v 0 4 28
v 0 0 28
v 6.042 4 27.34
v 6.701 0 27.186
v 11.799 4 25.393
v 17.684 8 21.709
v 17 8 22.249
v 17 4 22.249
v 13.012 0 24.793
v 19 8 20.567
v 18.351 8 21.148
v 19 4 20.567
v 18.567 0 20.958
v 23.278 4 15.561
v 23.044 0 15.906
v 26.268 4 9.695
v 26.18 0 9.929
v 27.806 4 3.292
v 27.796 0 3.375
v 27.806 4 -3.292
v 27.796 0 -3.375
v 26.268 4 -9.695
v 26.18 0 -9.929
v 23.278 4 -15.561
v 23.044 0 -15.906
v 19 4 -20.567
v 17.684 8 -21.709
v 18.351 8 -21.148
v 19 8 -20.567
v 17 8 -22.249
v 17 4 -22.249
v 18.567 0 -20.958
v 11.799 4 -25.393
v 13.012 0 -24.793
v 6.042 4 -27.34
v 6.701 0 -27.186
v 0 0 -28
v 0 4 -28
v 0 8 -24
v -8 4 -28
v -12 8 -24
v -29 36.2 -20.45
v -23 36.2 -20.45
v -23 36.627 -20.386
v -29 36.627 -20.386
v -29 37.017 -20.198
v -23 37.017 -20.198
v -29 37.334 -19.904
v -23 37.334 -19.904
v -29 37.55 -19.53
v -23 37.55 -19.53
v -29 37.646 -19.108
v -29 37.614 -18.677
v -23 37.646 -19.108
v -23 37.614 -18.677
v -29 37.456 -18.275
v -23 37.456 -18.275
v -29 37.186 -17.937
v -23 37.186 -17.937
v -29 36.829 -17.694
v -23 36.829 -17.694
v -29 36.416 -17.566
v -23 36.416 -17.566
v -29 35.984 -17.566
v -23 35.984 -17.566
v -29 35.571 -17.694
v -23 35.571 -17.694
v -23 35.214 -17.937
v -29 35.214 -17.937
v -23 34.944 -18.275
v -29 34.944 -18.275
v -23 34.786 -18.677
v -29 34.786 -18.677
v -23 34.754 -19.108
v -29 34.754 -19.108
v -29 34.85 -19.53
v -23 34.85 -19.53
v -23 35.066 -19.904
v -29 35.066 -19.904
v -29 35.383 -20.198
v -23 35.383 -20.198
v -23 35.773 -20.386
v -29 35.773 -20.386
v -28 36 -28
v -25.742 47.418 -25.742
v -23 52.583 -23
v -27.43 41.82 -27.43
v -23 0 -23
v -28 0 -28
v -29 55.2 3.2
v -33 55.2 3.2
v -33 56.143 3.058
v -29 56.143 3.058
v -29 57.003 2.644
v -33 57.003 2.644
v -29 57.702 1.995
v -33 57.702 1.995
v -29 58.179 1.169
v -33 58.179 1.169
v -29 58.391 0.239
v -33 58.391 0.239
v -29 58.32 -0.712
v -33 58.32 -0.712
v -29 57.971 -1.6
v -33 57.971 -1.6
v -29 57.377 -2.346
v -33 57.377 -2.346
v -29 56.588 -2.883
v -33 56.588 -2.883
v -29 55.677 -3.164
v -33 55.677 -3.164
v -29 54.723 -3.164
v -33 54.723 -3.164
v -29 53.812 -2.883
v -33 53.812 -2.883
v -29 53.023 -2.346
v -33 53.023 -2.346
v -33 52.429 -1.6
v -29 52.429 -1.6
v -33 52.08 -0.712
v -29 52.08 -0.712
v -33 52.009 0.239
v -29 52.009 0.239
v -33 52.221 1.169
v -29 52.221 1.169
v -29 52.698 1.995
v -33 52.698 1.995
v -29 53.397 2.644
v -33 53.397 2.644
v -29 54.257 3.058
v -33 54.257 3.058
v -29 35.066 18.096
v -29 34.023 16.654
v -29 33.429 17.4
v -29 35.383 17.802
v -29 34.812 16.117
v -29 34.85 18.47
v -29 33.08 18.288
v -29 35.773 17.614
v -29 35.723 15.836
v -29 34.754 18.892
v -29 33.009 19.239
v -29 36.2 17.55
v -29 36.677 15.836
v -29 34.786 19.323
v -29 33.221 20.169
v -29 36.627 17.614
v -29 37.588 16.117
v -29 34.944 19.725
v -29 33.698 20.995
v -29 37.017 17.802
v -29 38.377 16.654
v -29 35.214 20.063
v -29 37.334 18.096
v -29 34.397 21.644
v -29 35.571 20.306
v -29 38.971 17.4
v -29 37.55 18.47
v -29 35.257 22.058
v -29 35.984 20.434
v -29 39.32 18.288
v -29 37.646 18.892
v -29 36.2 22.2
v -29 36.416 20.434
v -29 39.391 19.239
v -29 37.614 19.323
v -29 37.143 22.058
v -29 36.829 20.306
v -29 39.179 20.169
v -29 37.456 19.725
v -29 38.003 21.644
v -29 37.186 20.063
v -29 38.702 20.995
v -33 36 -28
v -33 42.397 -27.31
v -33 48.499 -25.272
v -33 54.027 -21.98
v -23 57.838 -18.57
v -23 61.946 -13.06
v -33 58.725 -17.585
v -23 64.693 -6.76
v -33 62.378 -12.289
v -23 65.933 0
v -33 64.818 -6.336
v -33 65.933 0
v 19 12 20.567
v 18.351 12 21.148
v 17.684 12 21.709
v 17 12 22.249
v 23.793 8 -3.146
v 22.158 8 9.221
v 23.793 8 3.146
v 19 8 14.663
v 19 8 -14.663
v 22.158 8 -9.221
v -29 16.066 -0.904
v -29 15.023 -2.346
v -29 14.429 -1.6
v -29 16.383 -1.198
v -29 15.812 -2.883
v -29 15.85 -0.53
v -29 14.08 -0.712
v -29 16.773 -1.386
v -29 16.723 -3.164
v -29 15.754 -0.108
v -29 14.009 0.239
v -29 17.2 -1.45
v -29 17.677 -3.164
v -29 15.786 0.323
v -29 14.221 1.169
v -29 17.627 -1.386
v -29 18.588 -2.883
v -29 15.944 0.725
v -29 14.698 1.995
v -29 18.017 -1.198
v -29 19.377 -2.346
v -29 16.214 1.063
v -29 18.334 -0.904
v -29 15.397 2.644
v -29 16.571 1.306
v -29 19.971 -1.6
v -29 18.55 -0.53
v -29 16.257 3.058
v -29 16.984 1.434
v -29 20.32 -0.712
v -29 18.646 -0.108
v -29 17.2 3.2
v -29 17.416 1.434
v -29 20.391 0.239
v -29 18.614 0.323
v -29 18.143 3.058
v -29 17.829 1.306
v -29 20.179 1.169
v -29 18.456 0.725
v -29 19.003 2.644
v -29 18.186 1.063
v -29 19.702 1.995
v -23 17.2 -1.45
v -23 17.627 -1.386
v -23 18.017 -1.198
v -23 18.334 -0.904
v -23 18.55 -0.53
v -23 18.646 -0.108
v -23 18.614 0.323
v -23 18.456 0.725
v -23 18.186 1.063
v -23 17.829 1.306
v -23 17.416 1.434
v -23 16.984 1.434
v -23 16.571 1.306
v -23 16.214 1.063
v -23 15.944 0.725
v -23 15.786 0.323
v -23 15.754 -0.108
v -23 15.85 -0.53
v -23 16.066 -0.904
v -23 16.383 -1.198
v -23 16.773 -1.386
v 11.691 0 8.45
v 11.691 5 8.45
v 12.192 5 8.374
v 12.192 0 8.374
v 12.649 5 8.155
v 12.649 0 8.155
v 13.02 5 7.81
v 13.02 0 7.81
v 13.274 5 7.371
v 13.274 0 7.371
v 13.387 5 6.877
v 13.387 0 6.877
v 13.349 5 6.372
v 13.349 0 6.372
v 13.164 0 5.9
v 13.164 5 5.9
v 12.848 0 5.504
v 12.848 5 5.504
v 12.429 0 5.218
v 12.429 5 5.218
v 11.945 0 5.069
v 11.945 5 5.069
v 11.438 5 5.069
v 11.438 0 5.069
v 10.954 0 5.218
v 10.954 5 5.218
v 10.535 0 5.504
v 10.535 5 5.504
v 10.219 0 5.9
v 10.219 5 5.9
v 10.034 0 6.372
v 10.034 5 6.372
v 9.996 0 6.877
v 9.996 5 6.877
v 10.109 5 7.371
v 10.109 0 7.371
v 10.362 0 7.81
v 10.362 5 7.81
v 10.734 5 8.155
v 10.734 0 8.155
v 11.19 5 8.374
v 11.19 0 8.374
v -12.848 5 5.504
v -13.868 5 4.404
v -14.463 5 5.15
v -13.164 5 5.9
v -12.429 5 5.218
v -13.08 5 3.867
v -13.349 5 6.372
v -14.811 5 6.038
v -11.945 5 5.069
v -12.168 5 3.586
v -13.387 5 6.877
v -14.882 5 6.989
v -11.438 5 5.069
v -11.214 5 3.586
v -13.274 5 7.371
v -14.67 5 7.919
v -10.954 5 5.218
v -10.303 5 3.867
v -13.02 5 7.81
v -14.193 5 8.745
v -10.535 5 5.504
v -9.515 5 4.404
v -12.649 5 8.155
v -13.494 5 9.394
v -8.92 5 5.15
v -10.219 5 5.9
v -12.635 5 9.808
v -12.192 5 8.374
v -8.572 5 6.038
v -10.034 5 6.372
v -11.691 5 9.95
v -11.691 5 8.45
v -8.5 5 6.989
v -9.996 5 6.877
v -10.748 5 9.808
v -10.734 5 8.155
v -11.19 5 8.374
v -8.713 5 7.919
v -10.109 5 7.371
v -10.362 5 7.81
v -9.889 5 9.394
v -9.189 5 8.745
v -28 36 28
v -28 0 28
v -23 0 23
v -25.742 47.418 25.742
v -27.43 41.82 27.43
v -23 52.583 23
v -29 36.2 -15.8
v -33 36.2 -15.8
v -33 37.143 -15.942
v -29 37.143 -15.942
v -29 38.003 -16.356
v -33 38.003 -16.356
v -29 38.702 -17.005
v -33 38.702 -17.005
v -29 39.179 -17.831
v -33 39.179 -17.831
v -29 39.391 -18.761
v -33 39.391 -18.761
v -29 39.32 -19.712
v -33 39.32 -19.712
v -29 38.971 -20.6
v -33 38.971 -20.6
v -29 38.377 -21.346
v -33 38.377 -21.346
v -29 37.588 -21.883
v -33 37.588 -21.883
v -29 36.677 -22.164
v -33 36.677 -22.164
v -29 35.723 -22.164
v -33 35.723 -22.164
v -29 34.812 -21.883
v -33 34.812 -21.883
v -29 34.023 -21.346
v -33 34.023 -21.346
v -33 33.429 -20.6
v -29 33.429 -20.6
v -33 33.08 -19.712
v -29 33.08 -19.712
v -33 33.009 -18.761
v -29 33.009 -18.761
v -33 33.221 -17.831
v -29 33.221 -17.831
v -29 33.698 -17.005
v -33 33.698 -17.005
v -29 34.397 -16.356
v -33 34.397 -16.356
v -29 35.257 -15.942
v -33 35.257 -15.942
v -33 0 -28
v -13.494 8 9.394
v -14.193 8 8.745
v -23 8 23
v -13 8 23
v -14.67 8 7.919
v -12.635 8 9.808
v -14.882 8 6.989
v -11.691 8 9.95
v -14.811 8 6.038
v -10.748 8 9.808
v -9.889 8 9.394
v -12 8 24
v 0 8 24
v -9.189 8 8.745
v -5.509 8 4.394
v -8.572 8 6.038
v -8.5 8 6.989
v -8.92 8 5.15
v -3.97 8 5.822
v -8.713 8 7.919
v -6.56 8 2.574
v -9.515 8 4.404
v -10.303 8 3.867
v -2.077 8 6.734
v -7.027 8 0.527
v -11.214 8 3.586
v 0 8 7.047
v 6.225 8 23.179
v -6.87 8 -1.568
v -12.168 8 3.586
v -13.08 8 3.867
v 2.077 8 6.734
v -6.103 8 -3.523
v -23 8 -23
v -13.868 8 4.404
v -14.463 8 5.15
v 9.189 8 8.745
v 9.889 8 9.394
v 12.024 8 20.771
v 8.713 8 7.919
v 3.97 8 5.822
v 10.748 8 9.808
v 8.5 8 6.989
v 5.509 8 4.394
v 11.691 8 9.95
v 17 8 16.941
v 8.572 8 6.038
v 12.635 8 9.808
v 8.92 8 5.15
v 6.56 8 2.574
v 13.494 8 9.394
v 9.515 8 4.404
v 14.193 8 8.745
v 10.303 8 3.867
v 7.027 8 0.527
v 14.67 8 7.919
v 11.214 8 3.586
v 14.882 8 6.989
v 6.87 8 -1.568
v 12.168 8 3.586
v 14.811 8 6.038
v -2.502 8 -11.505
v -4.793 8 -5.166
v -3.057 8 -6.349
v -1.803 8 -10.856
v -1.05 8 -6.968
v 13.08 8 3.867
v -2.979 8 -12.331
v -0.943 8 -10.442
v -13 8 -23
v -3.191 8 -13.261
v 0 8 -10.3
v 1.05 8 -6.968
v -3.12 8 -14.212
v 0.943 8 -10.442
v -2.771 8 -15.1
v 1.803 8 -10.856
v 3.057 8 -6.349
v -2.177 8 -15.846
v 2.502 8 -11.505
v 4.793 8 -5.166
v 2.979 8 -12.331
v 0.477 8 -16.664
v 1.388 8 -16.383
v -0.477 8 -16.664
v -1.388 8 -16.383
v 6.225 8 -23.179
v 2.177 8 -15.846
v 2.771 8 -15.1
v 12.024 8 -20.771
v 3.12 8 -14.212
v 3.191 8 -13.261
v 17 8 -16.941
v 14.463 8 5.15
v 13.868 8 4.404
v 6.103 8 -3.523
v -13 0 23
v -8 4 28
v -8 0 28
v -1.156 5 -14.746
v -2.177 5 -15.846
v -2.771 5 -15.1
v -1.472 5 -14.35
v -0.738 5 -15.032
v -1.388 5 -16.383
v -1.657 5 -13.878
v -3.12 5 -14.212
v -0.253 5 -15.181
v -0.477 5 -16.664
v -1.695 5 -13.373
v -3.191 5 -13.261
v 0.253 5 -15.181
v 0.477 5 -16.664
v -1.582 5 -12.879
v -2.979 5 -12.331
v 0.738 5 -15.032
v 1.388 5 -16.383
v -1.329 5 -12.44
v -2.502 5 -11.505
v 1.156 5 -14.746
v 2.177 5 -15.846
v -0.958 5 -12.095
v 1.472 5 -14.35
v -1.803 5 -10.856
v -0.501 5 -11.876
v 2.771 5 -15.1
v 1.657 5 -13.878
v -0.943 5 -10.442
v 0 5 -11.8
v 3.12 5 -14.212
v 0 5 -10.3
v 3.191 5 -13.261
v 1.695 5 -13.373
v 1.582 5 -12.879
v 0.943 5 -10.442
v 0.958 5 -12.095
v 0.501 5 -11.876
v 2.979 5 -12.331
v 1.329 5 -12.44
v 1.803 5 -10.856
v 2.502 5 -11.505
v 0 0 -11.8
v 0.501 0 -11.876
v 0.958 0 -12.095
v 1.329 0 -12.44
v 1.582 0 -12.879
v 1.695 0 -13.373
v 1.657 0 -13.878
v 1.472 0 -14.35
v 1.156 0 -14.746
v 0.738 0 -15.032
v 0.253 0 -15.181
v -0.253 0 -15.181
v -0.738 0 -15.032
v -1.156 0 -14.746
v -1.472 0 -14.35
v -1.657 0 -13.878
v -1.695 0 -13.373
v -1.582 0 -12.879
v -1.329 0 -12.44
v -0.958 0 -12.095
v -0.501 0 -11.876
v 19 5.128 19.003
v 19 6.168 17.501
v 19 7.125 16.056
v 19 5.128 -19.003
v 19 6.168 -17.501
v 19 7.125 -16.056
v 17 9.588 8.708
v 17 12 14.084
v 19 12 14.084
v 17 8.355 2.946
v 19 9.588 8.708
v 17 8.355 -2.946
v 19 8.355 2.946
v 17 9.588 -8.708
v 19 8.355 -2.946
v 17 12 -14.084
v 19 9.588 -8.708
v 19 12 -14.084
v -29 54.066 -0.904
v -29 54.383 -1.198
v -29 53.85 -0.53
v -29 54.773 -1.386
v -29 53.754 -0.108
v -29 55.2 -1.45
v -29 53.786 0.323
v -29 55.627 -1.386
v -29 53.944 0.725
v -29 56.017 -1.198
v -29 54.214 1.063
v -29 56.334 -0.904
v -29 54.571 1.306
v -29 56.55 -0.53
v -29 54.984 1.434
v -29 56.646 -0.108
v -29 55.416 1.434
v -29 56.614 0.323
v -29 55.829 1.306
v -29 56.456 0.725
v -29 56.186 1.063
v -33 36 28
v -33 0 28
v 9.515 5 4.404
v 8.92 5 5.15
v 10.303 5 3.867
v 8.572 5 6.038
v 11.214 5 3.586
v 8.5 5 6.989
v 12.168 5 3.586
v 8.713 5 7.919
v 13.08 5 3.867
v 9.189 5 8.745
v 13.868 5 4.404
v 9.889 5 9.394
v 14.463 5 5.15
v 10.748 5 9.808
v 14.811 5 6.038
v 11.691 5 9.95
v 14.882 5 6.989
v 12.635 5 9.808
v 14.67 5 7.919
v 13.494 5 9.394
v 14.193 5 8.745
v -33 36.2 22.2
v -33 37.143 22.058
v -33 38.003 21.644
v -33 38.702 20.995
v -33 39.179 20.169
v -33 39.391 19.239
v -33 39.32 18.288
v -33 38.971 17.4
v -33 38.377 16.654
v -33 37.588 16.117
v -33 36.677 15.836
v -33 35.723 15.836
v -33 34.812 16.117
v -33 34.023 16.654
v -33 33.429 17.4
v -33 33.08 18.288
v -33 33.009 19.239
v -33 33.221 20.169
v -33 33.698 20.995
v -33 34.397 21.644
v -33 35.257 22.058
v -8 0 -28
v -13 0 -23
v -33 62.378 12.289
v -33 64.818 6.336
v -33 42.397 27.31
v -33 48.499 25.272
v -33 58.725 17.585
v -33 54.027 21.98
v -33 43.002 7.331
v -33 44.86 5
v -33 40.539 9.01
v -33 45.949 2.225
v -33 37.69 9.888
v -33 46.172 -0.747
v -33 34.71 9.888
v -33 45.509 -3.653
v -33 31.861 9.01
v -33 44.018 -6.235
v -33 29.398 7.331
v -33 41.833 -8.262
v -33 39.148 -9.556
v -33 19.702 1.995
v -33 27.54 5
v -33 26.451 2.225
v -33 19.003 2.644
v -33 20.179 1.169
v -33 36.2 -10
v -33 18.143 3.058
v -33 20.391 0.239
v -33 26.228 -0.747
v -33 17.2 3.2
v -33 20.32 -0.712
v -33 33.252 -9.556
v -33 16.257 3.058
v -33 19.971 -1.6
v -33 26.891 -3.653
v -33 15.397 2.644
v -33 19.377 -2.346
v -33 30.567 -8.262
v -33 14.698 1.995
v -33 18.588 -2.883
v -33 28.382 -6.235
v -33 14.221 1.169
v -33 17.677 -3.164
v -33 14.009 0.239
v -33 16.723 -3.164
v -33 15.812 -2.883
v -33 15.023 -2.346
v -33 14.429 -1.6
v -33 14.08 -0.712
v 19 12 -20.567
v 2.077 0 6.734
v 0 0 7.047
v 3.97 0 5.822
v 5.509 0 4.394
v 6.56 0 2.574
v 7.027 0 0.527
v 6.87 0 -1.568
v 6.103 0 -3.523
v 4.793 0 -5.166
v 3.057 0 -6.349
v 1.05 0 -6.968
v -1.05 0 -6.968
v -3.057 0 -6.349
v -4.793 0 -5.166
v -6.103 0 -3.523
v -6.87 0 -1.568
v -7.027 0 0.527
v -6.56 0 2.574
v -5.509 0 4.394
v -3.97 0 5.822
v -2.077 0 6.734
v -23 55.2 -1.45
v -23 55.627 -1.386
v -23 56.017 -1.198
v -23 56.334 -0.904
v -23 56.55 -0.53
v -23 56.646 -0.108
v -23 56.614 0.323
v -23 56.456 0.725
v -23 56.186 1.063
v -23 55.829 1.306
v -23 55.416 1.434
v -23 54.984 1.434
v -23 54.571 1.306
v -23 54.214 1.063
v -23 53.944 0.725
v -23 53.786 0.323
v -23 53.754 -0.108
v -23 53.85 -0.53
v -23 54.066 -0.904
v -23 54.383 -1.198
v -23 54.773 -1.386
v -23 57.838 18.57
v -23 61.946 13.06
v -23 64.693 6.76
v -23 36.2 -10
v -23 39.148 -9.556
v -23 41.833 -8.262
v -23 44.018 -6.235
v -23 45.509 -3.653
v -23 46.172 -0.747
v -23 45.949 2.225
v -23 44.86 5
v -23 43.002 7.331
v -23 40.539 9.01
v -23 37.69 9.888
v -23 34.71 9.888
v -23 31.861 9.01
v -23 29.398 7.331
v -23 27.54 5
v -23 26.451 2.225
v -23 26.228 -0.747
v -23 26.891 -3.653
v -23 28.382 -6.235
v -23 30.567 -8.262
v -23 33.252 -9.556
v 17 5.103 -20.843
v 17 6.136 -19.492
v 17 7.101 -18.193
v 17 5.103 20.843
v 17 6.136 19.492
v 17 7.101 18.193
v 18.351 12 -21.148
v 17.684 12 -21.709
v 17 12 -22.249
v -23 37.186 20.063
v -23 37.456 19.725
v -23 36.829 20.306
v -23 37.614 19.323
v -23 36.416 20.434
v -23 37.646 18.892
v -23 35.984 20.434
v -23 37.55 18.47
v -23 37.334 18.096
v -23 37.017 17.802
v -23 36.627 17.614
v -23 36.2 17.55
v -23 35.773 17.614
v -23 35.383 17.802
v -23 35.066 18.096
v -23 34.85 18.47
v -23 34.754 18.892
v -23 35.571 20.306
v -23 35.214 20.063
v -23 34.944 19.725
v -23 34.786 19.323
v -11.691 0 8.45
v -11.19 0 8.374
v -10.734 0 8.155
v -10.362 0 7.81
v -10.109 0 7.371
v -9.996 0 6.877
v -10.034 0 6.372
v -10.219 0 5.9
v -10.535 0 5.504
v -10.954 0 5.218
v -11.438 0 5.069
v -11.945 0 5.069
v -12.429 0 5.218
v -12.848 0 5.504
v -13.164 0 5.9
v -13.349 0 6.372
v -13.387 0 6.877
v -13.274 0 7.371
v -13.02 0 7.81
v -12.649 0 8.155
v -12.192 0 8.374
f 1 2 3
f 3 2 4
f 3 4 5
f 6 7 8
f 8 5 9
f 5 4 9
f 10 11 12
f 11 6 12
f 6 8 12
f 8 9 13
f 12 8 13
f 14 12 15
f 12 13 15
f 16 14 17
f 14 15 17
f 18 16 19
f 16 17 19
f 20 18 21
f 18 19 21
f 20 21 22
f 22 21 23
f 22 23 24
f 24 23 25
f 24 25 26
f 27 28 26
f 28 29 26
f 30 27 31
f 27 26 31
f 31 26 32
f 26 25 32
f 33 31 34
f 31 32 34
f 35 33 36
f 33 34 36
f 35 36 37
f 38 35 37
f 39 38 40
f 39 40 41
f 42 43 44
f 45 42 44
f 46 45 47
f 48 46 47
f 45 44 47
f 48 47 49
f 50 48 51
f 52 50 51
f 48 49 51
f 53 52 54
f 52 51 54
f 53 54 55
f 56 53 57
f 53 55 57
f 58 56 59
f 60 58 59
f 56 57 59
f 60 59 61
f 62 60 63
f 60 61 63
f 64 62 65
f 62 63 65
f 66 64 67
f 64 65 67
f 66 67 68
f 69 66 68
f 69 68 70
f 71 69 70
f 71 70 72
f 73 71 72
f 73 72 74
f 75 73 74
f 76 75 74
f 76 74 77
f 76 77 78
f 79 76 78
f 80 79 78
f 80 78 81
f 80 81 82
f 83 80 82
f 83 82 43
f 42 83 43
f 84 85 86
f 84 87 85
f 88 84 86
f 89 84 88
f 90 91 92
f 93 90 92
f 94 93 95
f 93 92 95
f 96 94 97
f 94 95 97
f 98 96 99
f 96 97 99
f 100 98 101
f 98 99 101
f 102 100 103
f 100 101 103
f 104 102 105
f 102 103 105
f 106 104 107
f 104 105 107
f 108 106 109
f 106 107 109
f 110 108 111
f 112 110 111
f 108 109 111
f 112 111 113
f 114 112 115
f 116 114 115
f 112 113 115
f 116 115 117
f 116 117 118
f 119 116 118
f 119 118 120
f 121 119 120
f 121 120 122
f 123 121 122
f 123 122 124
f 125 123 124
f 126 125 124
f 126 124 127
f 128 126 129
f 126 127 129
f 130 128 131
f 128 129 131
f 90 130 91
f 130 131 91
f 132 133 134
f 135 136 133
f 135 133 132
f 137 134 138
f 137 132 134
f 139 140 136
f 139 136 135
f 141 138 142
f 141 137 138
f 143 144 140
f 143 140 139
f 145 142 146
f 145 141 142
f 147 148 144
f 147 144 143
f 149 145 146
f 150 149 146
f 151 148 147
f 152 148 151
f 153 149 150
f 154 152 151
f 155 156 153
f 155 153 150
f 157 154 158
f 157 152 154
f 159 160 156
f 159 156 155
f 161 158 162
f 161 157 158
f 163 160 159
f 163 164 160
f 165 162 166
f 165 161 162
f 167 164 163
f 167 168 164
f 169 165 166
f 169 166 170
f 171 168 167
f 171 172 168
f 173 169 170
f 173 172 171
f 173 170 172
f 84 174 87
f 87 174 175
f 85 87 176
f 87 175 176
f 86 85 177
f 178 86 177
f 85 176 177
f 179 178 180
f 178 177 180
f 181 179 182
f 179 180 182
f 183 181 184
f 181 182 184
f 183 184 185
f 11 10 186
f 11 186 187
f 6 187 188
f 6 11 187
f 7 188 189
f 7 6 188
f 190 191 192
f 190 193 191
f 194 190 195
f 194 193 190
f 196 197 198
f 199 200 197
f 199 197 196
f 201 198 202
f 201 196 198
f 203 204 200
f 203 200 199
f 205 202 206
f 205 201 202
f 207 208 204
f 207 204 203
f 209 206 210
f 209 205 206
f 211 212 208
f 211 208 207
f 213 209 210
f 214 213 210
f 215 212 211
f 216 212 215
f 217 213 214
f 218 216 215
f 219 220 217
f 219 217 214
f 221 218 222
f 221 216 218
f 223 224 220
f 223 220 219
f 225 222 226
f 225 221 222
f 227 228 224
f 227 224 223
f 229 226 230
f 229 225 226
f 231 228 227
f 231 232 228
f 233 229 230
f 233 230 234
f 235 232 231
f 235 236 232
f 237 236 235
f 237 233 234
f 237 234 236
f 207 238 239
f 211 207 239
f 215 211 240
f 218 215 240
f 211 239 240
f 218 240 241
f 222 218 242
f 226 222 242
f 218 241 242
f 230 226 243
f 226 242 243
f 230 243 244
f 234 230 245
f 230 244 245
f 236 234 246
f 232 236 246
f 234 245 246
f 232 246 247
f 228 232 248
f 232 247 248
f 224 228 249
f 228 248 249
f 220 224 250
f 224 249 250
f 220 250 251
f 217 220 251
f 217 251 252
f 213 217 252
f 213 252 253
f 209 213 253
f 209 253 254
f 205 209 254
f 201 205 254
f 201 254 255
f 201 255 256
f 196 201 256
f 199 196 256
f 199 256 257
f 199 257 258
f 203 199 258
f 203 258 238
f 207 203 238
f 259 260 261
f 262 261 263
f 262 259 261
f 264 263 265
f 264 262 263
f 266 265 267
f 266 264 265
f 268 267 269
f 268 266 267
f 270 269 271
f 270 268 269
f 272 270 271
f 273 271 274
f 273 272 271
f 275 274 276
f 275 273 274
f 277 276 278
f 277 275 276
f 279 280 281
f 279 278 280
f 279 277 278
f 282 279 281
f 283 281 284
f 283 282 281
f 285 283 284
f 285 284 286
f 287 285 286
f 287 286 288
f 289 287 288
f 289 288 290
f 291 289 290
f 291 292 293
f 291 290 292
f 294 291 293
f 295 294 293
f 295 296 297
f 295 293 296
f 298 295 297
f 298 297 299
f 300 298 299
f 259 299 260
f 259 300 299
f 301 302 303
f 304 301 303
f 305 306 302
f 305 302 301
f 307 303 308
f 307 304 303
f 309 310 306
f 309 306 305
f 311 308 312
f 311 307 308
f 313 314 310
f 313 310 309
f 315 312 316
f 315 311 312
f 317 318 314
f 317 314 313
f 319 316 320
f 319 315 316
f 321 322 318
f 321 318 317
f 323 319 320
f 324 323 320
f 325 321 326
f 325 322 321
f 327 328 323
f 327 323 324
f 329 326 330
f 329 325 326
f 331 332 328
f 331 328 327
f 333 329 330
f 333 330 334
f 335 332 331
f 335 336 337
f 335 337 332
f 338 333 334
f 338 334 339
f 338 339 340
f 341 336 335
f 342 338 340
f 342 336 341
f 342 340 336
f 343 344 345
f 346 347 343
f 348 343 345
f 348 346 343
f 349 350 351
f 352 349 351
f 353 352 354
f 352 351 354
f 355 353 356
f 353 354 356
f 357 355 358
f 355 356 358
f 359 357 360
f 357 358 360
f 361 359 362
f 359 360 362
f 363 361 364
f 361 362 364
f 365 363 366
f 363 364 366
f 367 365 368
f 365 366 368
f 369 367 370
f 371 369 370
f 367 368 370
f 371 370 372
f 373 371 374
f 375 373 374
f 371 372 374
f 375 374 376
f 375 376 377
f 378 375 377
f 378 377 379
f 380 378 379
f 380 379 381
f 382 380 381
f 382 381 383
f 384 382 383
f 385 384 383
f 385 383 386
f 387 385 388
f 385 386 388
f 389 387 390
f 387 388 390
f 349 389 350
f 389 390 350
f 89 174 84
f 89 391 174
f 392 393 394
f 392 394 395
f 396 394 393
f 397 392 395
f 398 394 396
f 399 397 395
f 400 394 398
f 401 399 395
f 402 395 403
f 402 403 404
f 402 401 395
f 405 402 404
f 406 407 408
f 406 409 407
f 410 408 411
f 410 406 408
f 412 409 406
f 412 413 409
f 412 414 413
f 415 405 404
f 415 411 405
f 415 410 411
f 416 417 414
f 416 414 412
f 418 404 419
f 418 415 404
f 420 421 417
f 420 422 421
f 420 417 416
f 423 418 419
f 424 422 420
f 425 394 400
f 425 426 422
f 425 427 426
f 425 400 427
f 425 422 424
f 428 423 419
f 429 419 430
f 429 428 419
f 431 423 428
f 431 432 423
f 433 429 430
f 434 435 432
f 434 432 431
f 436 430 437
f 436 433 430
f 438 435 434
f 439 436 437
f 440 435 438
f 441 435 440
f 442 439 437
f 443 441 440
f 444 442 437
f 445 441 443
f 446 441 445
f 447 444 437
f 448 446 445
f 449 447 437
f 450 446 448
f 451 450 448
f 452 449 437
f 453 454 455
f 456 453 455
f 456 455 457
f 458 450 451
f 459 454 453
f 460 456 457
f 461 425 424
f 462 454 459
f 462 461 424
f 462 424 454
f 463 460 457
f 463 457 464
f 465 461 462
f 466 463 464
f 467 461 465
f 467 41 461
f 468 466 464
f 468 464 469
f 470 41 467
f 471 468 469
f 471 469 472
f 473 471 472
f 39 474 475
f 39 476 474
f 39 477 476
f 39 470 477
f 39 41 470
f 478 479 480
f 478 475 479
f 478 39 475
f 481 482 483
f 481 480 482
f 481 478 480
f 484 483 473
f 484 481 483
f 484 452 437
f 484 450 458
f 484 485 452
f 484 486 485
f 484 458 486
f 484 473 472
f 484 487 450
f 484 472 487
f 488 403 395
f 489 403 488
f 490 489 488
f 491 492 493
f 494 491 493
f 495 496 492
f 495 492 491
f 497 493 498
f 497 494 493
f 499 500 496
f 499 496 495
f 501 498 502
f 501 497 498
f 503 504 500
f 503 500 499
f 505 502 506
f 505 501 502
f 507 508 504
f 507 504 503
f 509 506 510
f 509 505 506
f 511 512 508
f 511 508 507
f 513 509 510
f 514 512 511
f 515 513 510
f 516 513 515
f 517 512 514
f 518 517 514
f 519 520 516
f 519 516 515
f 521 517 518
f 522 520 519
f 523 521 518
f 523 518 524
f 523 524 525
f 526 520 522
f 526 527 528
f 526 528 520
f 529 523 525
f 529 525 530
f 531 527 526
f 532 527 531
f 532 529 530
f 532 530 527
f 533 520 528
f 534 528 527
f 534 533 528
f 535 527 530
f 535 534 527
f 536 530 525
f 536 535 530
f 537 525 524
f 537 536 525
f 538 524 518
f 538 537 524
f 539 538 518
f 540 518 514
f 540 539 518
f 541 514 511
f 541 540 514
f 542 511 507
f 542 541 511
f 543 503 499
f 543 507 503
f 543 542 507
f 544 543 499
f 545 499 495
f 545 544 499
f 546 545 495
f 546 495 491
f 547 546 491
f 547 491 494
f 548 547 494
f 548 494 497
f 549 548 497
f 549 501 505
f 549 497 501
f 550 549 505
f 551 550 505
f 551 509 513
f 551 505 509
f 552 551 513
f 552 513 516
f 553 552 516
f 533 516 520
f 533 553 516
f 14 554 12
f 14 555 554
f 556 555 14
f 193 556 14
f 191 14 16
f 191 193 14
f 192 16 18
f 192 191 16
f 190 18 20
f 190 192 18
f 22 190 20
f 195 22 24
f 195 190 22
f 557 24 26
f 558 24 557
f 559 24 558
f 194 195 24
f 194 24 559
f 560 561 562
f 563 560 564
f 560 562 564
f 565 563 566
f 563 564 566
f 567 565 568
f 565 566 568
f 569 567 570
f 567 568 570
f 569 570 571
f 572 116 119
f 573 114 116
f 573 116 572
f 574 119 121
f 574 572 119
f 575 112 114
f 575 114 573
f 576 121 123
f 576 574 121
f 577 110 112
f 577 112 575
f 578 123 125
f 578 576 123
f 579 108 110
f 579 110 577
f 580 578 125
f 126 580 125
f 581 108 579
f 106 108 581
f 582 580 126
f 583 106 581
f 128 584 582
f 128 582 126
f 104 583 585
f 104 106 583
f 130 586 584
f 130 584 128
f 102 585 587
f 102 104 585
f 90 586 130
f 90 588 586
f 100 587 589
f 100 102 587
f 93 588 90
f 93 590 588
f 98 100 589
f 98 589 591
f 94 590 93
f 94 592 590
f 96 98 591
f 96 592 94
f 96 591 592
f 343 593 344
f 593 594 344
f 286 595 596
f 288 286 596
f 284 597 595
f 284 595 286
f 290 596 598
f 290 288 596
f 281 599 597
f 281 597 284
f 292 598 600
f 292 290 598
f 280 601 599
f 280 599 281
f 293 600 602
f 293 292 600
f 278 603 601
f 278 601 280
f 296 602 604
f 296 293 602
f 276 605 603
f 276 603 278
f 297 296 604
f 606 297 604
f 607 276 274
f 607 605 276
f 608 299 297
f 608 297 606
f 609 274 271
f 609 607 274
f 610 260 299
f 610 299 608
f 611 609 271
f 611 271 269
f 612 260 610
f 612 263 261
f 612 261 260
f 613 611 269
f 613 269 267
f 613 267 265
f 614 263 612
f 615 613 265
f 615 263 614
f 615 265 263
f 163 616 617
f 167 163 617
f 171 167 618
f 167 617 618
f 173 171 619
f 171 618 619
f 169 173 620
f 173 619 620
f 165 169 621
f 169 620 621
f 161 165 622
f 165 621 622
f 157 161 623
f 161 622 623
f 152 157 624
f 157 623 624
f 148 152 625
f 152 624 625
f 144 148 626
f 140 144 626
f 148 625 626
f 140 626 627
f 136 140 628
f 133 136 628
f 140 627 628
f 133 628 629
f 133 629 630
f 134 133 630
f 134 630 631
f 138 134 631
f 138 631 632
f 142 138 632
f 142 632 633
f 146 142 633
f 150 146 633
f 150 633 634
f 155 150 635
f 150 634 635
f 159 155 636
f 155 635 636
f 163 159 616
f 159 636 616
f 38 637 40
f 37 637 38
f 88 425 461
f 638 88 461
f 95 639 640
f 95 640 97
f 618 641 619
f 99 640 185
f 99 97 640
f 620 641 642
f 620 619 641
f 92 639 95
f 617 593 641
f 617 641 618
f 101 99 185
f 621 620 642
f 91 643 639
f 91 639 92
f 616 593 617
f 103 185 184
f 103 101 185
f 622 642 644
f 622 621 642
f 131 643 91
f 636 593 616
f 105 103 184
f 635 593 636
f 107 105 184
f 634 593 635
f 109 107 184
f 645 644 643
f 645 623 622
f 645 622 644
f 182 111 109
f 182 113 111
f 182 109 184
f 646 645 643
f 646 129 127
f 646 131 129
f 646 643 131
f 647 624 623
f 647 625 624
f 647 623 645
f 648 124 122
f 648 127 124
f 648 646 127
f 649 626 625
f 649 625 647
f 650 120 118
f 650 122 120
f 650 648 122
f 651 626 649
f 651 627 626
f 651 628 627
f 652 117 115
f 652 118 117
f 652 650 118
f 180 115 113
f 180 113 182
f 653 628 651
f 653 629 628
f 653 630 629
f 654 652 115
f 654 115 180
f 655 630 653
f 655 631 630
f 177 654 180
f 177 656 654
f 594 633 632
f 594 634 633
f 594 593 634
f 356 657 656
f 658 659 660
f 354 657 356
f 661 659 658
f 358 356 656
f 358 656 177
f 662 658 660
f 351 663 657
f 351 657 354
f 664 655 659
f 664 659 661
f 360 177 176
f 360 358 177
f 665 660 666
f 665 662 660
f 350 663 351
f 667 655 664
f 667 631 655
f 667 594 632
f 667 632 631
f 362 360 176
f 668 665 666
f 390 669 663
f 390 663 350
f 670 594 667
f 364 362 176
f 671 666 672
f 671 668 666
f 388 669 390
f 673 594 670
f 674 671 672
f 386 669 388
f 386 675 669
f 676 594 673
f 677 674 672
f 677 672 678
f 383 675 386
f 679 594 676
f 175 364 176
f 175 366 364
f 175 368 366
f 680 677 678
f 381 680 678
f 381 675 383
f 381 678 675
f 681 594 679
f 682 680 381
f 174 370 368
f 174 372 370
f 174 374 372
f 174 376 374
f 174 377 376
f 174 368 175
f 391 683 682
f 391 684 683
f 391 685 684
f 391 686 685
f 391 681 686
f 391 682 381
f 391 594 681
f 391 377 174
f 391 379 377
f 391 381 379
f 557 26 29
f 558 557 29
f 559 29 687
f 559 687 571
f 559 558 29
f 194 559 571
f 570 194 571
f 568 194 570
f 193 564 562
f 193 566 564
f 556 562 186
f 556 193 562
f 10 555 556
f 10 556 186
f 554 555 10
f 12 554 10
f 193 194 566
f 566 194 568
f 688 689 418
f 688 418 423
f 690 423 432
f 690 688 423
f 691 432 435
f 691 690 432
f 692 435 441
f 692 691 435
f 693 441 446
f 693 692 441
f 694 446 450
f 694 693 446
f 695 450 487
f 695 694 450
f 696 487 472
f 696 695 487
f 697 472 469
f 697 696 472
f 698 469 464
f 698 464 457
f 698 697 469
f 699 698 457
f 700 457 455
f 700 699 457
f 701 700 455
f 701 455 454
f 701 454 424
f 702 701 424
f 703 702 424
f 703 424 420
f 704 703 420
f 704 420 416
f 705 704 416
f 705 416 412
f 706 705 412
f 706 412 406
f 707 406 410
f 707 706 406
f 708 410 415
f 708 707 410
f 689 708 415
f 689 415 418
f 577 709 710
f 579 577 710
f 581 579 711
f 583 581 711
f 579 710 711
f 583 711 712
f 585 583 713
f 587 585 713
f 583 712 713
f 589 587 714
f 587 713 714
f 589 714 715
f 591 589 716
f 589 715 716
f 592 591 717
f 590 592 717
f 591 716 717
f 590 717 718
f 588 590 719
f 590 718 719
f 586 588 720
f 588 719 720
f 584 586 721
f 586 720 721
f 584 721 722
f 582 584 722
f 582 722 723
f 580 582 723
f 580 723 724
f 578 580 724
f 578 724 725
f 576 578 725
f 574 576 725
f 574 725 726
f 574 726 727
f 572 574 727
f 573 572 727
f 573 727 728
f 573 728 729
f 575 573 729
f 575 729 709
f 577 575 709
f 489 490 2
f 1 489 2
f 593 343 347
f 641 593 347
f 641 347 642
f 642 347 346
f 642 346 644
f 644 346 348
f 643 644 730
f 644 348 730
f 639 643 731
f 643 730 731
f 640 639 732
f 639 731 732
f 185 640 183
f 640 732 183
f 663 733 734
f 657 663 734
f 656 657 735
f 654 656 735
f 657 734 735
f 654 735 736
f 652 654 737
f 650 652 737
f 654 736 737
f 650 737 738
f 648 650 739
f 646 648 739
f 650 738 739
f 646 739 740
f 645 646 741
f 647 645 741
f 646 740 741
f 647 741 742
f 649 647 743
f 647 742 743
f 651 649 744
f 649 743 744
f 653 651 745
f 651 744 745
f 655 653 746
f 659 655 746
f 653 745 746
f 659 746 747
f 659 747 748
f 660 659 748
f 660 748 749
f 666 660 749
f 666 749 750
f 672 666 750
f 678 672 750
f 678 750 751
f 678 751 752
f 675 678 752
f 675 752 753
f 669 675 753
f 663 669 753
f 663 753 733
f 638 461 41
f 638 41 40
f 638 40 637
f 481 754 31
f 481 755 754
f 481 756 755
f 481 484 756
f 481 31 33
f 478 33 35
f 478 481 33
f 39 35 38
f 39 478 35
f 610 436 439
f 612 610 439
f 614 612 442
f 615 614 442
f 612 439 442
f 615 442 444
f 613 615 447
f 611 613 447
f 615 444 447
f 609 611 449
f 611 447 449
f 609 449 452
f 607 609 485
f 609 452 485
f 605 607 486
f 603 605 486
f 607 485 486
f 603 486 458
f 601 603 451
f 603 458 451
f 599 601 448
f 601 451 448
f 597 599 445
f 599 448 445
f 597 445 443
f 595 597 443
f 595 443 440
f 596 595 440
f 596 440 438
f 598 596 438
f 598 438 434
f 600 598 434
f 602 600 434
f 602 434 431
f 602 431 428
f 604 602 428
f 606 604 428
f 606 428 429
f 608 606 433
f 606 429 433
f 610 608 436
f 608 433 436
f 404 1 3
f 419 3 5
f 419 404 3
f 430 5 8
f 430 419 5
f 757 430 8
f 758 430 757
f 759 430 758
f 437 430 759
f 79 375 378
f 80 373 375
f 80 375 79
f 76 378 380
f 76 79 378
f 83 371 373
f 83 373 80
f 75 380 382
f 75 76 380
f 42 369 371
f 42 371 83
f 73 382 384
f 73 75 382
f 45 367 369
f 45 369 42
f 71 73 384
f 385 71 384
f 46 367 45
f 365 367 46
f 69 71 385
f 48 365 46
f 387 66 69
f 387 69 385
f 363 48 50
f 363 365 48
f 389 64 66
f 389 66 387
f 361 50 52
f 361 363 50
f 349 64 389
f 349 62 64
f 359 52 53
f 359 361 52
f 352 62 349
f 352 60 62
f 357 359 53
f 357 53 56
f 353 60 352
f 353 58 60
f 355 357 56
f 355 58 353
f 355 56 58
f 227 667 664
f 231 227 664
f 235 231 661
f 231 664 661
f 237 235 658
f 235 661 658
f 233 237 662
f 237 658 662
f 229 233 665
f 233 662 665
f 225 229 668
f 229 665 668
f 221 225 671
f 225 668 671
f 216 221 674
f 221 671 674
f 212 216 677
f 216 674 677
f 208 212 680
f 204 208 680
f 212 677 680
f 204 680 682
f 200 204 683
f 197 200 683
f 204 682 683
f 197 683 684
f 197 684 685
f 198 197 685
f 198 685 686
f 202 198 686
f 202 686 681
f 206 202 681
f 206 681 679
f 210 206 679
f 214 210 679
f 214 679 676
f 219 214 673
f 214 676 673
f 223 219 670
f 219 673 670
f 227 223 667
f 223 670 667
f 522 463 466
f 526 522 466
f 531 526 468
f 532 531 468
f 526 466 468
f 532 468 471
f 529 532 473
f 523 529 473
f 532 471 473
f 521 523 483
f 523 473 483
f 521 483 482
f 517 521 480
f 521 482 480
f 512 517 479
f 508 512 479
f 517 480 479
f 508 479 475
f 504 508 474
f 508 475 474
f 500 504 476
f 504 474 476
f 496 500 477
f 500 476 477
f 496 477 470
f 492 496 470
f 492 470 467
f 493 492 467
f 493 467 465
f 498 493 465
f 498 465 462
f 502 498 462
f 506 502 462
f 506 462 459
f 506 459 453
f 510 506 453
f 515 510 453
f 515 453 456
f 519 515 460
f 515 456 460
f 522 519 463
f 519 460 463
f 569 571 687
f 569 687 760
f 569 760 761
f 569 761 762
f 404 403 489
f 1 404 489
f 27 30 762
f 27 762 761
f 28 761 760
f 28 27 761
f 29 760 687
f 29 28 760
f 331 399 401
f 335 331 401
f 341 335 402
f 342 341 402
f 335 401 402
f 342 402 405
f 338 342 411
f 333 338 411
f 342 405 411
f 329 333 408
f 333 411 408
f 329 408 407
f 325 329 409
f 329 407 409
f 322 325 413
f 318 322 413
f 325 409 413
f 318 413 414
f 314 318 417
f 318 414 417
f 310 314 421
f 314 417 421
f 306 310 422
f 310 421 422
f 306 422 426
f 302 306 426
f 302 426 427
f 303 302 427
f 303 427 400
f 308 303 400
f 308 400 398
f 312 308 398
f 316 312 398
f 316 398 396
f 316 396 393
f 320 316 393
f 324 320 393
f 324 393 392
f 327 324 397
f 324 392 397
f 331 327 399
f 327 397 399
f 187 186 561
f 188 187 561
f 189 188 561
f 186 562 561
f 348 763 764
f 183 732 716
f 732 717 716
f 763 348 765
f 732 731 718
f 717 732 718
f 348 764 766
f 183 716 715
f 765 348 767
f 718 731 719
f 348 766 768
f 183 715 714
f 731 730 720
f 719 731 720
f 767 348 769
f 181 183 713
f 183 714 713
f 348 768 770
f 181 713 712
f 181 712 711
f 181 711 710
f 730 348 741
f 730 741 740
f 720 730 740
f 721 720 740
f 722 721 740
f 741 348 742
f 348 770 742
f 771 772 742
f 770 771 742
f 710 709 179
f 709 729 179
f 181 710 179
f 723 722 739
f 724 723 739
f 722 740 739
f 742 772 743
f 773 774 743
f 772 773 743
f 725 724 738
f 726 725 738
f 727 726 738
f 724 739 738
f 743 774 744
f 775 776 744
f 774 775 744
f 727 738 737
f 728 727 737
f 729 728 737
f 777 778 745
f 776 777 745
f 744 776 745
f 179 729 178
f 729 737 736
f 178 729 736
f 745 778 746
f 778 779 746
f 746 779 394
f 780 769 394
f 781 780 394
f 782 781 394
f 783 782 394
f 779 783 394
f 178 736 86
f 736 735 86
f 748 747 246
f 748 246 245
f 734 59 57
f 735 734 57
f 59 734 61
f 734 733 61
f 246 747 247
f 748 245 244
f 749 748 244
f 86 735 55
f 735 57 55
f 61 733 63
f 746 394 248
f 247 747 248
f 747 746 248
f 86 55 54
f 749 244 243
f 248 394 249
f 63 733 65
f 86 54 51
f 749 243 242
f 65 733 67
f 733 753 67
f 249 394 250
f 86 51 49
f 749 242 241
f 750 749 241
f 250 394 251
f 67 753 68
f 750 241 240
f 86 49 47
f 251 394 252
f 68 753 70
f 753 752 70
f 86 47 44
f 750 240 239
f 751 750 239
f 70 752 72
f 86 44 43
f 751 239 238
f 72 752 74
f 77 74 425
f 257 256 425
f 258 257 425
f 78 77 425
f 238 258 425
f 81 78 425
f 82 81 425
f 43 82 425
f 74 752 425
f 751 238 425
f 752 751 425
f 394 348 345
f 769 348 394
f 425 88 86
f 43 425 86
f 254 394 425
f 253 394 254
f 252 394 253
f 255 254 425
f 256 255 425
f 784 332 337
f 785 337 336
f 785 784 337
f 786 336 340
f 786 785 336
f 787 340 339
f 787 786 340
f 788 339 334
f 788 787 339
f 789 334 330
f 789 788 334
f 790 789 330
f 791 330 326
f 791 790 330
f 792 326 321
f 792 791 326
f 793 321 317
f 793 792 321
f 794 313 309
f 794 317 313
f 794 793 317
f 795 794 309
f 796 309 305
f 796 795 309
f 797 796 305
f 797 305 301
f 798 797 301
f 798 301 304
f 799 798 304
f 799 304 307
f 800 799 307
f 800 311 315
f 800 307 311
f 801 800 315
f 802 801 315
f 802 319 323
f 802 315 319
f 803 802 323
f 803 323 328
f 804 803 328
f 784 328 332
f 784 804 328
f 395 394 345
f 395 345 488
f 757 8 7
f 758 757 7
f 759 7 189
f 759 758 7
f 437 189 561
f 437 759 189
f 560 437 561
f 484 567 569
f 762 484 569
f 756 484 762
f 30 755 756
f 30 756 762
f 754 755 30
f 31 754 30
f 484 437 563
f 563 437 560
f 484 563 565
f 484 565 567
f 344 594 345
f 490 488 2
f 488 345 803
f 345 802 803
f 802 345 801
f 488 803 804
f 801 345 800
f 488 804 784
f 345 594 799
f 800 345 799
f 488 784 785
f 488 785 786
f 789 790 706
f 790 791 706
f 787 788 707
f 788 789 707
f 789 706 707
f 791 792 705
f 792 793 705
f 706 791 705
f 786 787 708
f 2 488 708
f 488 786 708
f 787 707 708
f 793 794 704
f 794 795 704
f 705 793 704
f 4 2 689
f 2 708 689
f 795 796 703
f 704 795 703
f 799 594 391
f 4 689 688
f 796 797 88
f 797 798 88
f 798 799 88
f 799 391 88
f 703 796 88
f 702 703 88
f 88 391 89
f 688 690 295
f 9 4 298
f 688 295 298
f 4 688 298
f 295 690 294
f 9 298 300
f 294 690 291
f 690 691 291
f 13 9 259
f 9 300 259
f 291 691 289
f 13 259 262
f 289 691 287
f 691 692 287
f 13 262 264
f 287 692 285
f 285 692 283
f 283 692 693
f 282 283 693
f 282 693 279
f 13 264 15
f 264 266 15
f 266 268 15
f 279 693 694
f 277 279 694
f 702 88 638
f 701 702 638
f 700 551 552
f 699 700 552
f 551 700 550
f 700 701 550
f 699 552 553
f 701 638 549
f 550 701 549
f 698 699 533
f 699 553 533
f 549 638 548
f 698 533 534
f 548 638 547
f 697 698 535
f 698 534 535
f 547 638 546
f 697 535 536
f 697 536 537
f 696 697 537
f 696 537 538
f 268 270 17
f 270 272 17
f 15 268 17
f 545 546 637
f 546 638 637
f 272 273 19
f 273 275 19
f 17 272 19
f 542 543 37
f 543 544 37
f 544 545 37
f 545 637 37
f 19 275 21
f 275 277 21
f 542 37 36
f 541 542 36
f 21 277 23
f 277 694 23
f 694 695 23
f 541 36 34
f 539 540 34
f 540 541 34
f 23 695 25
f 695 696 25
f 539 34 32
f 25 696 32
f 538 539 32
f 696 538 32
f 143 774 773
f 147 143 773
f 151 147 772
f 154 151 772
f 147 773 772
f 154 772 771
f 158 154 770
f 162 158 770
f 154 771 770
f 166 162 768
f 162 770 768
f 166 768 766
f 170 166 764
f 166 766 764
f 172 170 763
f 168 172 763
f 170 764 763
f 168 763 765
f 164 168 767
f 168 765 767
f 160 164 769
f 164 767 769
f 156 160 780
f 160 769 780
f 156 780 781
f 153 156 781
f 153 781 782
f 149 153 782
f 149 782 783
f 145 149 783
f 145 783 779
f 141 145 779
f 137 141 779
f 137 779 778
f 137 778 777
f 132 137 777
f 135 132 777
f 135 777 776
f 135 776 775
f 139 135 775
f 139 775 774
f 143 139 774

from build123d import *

# Parameters (mm, degrees)
SKETCH_1_R          = 1.7
SKETCH_1_R_2        = 7.046714779
EXTRUDE_2_DEPTH     = 8
SKETCH_2_W          = 10
SKETCH_2_H          = 56
EXTRUDE_3_DEPTH     = 58
SKETCH_3_R          = 1.45
SKETCH_3_R_2        = 10
CUT_EXTRUDE_1_DEPTH = 22
SKETCH_5_W          = 10
SKETCH_5_H          = 20.367119739
CUT_EXTRUDE_3_DEPTH = 18
CHAMFER_1_SIZE      = 5
FILLET_1_R          = 30
SKETCH_6_R          = 3.2
CUT_EXTRUDE_4_DEPTH = 4
SKETCH_7_R          = 3.2
CUT_EXTRUDE_5_DEPTH = 3
EXTRUDE_4_DEPTH     = 4
SKETCH_9_R          = 28
CUT_EXTRUDE_6_DEPTH = 10
CHAMFER_2_SIZE      = 4


# Some blends are built 0.0001 mm under size
with BuildPart() as part:
    # 草图1 → 凸台-拉伸2 (new body)
    with BuildSketch(Plane(origin=(0, 0, 0), x_dir=(1, 0, 0), z_dir=(0, 1, 0))):
        with BuildLine():
            Line((-23, 28), (-33, 28))
            Line((-33, 28), (-33, -28))
            Line((-33, -28), (-23, -28))
            Line((-23, -28), (0, -28))
            ThreePointArc((0, -28), (28, 0), (0, 28))
            Line((0, 28), (-23, 28))
        make_face()
        with Locations(Location((0, 13.5, 0), (0, 0, 270))):
            Circle(SKETCH_1_R, mode=Mode.SUBTRACT)
        with Locations(Location((11.691342951, -6.75, 0), (0, 0, 270))):
            Circle(SKETCH_1_R, mode=Mode.SUBTRACT)
        with Locations(Location((-11.691342951, -6.75, 0), (0, 0, 270))):
            Circle(SKETCH_1_R, mode=Mode.SUBTRACT)
        with Locations(Location((0, 0, 0), (0, 0, 270))):
            Circle(SKETCH_1_R_2, mode=Mode.SUBTRACT)
    extrude(amount=EXTRUDE_2_DEPTH)

    # 草图2 → 凸台-拉伸3 (add)
    with BuildSketch(Plane(origin=(0, 8, 0), x_dir=(1, 0, 0), z_dir=(0, 1, 0))):
        with Locations((-28, 0)):
            Rectangle(SKETCH_2_W, SKETCH_2_H)
    extrude(amount=EXTRUDE_3_DEPTH)

    # 草图3 → 切除-拉伸1 (cut)
    with BuildSketch(Plane(origin=(-23, 0, 0), x_dir=(0, 0, -1), z_dir=(1, 0, 0))):
        with Locations((0, 55.2)):
            Circle(SKETCH_3_R)
        with Locations((19, 36.2)):
            Circle(SKETCH_3_R)
        with Locations((0, 17.2)):
            Circle(SKETCH_3_R)
        with Locations((-19, 36.2)):
            Circle(SKETCH_3_R)
        with Locations((0, 36.2)):
            Circle(SKETCH_3_R_2)
    extrude(amount=-CUT_EXTRUDE_1_DEPTH, mode=Mode.SUBTRACT)

    # 草图5 → 切除-拉伸3 (cut)
    with BuildSketch(Plane(origin=(0, 8, 0), x_dir=(1, 0, 0), z_dir=(0, 1, 0))):
        with Locations((-18, 33.18355987)):
            Rectangle(SKETCH_5_W, SKETCH_5_H)
        with Locations((-18, -33.18355987)):
            Rectangle(SKETCH_5_W, SKETCH_5_H)
    extrude(amount=-CUT_EXTRUDE_3_DEPTH, mode=Mode.SUBTRACT)

    # 倒角1
    chamfer_1_edges = [part.edges().sort_by_distance(p)[0] for p in [
        (-23, 33, 28),
        (-23, 33, -28),
        (-13, 4, -28),
        (-13, 4, 28),
    ]]
    chamfer(chamfer_1_edges, length=CHAMFER_1_SIZE - 0.0001)  # a hair under: the kernel refuses the full size

    # 圆角1
    # the kernel refuses this fillet: 30 mm, written as the material it takes off along each edge
    with BuildSketch(Plane(origin=(-108, 66, -28), x_dir=(0, -1, 0), z_dir=(1, 0, 0)), Plane(origin=(47.0001, 66, 28), x_dir=(0, -1, 0), z_dir=(-1, 0, 0))) as fillet_1_piece_1:
        with BuildLine():
            CenterArc((FILLET_1_R, -FILLET_1_R), FILLET_1_R, 90, 90)
            Line((0, -FILLET_1_R), (0, 0))
            Line((0, 0), (FILLET_1_R, 0))
        make_face()
    extrude(amount=155.0001, mode=Mode.SUBTRACT)

    # 草图6 → 切除-拉伸4 (cut)
    with BuildSketch(Plane.ZY.offset(33)):
        with Locations((-19, 36.2)):
            Circle(SKETCH_6_R)
        with Locations((0, 55.2)):
            Circle(SKETCH_6_R)
        with Locations((19, 36.2)):
            Circle(SKETCH_6_R)
        with Locations((0, 17.2)):
            Circle(SKETCH_6_R)
    extrude(amount=-CUT_EXTRUDE_4_DEPTH, mode=Mode.SUBTRACT)

    # 草图7 → 切除-拉伸5 (cut)
    with BuildSketch(Plane(origin=(0, 8, 0), x_dir=(1, 0, 0), z_dir=(0, 1, 0))):
        with Locations(Location((0, 13.5, 0), (0, 0, 270))):
            Circle(SKETCH_7_R)
        with Locations(Location((11.691342951, -6.75, 0), (0, 0, 270))):
            Circle(SKETCH_7_R)
        with Locations(Location((-11.691342951, -6.75, 0), (0, 0, 270))):
            Circle(SKETCH_7_R)
    extrude(amount=-CUT_EXTRUDE_5_DEPTH, mode=Mode.SUBTRACT)

    # 草图8 → 凸台-拉伸4 (add)
    with BuildSketch(Plane(origin=(0, 8, 0), x_dir=(1, 0, 0), z_dir=(0, 1, 0))):
        with BuildLine():
            Line((17, -22.248595461), (17, 22.248595461))
            ThreePointArc((17, 22.248595461), (18.01962739, 21.4311229), (19, 20.566963801))
            Line((19, 20.566963801), (19, -20.566963801))
            ThreePointArc((19, -20.566963801), (18.01962739, -21.4311229), (17, -22.248595461))
        make_face()
    extrude(amount=EXTRUDE_4_DEPTH)

    # 草图9 → 切除-拉伸6 (cut)
    with BuildSketch(Plane(origin=(19, 0, 0), x_dir=(0, 0, -1), z_dir=(1, 0, 0))):
        with Locations((0, 36.2)):
            Circle(SKETCH_9_R)
    extrude(amount=-CUT_EXTRUDE_6_DEPTH, mode=Mode.SUBTRACT)

    # 倒角2
    # the kernel refuses this chamfer: 4 mm, written as the material it takes off along each edge
    with BuildSketch(Plane(origin=(0, 8, 28), x_dir=(0, 0.027495876610586487, -0.9996219169112968), z_dir=(-1, 0, 0))) as chamfer_2_piece_1:
        Polygon((CHAMFER_2_SIZE * 0.999621916911, CHAMFER_2_SIZE * 0.0274958766106), (-CHAMFER_2_SIZE * 0.0274958766106, CHAMFER_2_SIZE * 0.999621916911), (0, 0), align=None)
    extrude(amount=18.286831952, mode=Mode.SUBTRACT)
    with BuildSketch(Plane(origin=(0, 8, 0), x_dir=(0.369313229341893, 0, 0.9293049761155173), z_dir=(-0.9293049761155173, 0, 0.369313229341893))) as chamfer_2_piece_2_section:
        Polygon((28, -CHAMFER_2_SIZE), (28 - CHAMFER_2_SIZE, 0), (28, 0), align=None)
    chamfer_2_piece_2 = revolve(axis=Axis((0, 8, 0), (0, 1, 0)), revolution_arc=136.653462803, mode=Mode.PRIVATE)
    chamfer_2_piece_2 = split(chamfer_2_piece_2, bisect_by=Plane(origin=(17, 6.694433411, 22.783727906), z_dir=(-1, 0, 0)), keep=Keep.TOP, mode=Mode.PRIVATE)
    add(chamfer_2_piece_2, mode=Mode.SUBTRACT)
    with BuildSketch(Plane(origin=(0, 8, 0), x_dir=(0.369313229341893, 0, 0.9293049761155173), z_dir=(-0.9293049761155173, 0, 0.369313229341893))) as chamfer_2_piece_3_section:
        Polygon((28, -CHAMFER_2_SIZE), (28 - CHAMFER_2_SIZE, 0), (28, 0), align=None)
    chamfer_2_piece_3 = revolve(axis=Axis((0, 8, 0), (0, 1, 0)), revolution_arc=136.653462803, mode=Mode.PRIVATE)
    chamfer_2_piece_3 = split(chamfer_2_piece_3, bisect_by=Plane(origin=(19, 6.048939882, 0), z_dir=(1, 0, 0)), keep=Keep.TOP, mode=Mode.PRIVATE)
    add(chamfer_2_piece_3, mode=Mode.SUBTRACT)
    with BuildSketch(Plane(origin=(0, 8, 0), x_dir=(0.8520392640465919, 0, -0.5234778815985848), z_dir=(0.5234778815985848, 0, 0.8520392640465919))) as chamfer_2_piece_4_section:
        Polygon((28, -CHAMFER_2_SIZE), (28 - CHAMFER_2_SIZE, 0), (28, 0), align=None)
    chamfer_2_piece_4 = revolve(axis=Axis((0, 8, 0), (0, 1, 0)), revolution_arc=58.434168598, mode=Mode.PRIVATE)
    chamfer_2_piece_4 = split(chamfer_2_piece_4, bisect_by=Plane(origin=(19, 6.574014783, -16.582020982), z_dir=(1, 0, 0)), keep=Keep.TOP, mode=Mode.PRIVATE)
    add(chamfer_2_piece_4, mode=Mode.SUBTRACT)
    with BuildSketch(Plane(origin=(0, 8, 0), x_dir=(0.8520392640465919, 0, -0.5234778815985848), z_dir=(0.5234778815985848, 0, 0.8520392640465919))) as chamfer_2_piece_5_section:
        Polygon((28, -CHAMFER_2_SIZE), (28 - CHAMFER_2_SIZE, 0), (28, 0), align=None)
    chamfer_2_piece_5 = revolve(axis=Axis((0, 8, 0), (0, 1, 0)), revolution_arc=58.434168598, mode=Mode.PRIVATE)
    chamfer_2_piece_5 = split(chamfer_2_piece_5, bisect_by=Plane(origin=(17, 6.670131388, -24.579888545), z_dir=(-1, 0, 0)), keep=Keep.TOP, mode=Mode.PRIVATE)
    add(chamfer_2_piece_5, mode=Mode.SUBTRACT)
    with BuildSketch(Plane(origin=(0, 8, 0), x_dir=(0, 0, 1), z_dir=(-1, 0, 0))) as chamfer_2_piece_6_section:
        Polygon((28, -CHAMFER_2_SIZE), (28 - CHAMFER_2_SIZE, 0), (28, 0), align=None)
    chamfer_2_piece_6 = revolve(axis=Axis((0, 8, 0), (0, 1, 0)), revolution_arc=58.434168598, mode=Mode.PRIVATE)
    chamfer_2_piece_6 = split(chamfer_2_piece_6, bisect_by=Plane(origin=(17, 6.670131388, 24.579888545), z_dir=(-1, 0, 0)), keep=Keep.TOP, mode=Mode.PRIVATE)
    add(chamfer_2_piece_6, mode=Mode.SUBTRACT)
    with BuildSketch(Plane(origin=(0, 8, 0), x_dir=(0, 0, 1), z_dir=(-1, 0, 0))) as chamfer_2_piece_7_section:
        Polygon((28, -CHAMFER_2_SIZE), (28 - CHAMFER_2_SIZE, 0), (28, 0), align=None)
    chamfer_2_piece_7 = revolve(axis=Axis((0, 8, 0), (0, 1, 0)), revolution_arc=58.434168598, mode=Mode.PRIVATE)
    chamfer_2_piece_7 = split(chamfer_2_piece_7, bisect_by=Plane(origin=(19, 6.574014783, 16.582020982), z_dir=(1, 0, 0)), keep=Keep.TOP, mode=Mode.PRIVATE)
    add(chamfer_2_piece_7, mode=Mode.SUBTRACT)
    with BuildSketch(Plane(origin=(-18.286831952, 8, -28), x_dir=(0, -0.9996219169112968, -0.027495876610586487), z_dir=(1, 0, 0))) as chamfer_2_piece_8:
        Polygon((CHAMFER_2_SIZE * 0.999621916911, -CHAMFER_2_SIZE * 0.0274958766106), (-CHAMFER_2_SIZE * 0.0274958766106, -CHAMFER_2_SIZE * 0.999621916911), (0, 0), align=None)
    extrude(amount=18.286831952, mode=Mode.SUBTRACT)


solid = part.part
